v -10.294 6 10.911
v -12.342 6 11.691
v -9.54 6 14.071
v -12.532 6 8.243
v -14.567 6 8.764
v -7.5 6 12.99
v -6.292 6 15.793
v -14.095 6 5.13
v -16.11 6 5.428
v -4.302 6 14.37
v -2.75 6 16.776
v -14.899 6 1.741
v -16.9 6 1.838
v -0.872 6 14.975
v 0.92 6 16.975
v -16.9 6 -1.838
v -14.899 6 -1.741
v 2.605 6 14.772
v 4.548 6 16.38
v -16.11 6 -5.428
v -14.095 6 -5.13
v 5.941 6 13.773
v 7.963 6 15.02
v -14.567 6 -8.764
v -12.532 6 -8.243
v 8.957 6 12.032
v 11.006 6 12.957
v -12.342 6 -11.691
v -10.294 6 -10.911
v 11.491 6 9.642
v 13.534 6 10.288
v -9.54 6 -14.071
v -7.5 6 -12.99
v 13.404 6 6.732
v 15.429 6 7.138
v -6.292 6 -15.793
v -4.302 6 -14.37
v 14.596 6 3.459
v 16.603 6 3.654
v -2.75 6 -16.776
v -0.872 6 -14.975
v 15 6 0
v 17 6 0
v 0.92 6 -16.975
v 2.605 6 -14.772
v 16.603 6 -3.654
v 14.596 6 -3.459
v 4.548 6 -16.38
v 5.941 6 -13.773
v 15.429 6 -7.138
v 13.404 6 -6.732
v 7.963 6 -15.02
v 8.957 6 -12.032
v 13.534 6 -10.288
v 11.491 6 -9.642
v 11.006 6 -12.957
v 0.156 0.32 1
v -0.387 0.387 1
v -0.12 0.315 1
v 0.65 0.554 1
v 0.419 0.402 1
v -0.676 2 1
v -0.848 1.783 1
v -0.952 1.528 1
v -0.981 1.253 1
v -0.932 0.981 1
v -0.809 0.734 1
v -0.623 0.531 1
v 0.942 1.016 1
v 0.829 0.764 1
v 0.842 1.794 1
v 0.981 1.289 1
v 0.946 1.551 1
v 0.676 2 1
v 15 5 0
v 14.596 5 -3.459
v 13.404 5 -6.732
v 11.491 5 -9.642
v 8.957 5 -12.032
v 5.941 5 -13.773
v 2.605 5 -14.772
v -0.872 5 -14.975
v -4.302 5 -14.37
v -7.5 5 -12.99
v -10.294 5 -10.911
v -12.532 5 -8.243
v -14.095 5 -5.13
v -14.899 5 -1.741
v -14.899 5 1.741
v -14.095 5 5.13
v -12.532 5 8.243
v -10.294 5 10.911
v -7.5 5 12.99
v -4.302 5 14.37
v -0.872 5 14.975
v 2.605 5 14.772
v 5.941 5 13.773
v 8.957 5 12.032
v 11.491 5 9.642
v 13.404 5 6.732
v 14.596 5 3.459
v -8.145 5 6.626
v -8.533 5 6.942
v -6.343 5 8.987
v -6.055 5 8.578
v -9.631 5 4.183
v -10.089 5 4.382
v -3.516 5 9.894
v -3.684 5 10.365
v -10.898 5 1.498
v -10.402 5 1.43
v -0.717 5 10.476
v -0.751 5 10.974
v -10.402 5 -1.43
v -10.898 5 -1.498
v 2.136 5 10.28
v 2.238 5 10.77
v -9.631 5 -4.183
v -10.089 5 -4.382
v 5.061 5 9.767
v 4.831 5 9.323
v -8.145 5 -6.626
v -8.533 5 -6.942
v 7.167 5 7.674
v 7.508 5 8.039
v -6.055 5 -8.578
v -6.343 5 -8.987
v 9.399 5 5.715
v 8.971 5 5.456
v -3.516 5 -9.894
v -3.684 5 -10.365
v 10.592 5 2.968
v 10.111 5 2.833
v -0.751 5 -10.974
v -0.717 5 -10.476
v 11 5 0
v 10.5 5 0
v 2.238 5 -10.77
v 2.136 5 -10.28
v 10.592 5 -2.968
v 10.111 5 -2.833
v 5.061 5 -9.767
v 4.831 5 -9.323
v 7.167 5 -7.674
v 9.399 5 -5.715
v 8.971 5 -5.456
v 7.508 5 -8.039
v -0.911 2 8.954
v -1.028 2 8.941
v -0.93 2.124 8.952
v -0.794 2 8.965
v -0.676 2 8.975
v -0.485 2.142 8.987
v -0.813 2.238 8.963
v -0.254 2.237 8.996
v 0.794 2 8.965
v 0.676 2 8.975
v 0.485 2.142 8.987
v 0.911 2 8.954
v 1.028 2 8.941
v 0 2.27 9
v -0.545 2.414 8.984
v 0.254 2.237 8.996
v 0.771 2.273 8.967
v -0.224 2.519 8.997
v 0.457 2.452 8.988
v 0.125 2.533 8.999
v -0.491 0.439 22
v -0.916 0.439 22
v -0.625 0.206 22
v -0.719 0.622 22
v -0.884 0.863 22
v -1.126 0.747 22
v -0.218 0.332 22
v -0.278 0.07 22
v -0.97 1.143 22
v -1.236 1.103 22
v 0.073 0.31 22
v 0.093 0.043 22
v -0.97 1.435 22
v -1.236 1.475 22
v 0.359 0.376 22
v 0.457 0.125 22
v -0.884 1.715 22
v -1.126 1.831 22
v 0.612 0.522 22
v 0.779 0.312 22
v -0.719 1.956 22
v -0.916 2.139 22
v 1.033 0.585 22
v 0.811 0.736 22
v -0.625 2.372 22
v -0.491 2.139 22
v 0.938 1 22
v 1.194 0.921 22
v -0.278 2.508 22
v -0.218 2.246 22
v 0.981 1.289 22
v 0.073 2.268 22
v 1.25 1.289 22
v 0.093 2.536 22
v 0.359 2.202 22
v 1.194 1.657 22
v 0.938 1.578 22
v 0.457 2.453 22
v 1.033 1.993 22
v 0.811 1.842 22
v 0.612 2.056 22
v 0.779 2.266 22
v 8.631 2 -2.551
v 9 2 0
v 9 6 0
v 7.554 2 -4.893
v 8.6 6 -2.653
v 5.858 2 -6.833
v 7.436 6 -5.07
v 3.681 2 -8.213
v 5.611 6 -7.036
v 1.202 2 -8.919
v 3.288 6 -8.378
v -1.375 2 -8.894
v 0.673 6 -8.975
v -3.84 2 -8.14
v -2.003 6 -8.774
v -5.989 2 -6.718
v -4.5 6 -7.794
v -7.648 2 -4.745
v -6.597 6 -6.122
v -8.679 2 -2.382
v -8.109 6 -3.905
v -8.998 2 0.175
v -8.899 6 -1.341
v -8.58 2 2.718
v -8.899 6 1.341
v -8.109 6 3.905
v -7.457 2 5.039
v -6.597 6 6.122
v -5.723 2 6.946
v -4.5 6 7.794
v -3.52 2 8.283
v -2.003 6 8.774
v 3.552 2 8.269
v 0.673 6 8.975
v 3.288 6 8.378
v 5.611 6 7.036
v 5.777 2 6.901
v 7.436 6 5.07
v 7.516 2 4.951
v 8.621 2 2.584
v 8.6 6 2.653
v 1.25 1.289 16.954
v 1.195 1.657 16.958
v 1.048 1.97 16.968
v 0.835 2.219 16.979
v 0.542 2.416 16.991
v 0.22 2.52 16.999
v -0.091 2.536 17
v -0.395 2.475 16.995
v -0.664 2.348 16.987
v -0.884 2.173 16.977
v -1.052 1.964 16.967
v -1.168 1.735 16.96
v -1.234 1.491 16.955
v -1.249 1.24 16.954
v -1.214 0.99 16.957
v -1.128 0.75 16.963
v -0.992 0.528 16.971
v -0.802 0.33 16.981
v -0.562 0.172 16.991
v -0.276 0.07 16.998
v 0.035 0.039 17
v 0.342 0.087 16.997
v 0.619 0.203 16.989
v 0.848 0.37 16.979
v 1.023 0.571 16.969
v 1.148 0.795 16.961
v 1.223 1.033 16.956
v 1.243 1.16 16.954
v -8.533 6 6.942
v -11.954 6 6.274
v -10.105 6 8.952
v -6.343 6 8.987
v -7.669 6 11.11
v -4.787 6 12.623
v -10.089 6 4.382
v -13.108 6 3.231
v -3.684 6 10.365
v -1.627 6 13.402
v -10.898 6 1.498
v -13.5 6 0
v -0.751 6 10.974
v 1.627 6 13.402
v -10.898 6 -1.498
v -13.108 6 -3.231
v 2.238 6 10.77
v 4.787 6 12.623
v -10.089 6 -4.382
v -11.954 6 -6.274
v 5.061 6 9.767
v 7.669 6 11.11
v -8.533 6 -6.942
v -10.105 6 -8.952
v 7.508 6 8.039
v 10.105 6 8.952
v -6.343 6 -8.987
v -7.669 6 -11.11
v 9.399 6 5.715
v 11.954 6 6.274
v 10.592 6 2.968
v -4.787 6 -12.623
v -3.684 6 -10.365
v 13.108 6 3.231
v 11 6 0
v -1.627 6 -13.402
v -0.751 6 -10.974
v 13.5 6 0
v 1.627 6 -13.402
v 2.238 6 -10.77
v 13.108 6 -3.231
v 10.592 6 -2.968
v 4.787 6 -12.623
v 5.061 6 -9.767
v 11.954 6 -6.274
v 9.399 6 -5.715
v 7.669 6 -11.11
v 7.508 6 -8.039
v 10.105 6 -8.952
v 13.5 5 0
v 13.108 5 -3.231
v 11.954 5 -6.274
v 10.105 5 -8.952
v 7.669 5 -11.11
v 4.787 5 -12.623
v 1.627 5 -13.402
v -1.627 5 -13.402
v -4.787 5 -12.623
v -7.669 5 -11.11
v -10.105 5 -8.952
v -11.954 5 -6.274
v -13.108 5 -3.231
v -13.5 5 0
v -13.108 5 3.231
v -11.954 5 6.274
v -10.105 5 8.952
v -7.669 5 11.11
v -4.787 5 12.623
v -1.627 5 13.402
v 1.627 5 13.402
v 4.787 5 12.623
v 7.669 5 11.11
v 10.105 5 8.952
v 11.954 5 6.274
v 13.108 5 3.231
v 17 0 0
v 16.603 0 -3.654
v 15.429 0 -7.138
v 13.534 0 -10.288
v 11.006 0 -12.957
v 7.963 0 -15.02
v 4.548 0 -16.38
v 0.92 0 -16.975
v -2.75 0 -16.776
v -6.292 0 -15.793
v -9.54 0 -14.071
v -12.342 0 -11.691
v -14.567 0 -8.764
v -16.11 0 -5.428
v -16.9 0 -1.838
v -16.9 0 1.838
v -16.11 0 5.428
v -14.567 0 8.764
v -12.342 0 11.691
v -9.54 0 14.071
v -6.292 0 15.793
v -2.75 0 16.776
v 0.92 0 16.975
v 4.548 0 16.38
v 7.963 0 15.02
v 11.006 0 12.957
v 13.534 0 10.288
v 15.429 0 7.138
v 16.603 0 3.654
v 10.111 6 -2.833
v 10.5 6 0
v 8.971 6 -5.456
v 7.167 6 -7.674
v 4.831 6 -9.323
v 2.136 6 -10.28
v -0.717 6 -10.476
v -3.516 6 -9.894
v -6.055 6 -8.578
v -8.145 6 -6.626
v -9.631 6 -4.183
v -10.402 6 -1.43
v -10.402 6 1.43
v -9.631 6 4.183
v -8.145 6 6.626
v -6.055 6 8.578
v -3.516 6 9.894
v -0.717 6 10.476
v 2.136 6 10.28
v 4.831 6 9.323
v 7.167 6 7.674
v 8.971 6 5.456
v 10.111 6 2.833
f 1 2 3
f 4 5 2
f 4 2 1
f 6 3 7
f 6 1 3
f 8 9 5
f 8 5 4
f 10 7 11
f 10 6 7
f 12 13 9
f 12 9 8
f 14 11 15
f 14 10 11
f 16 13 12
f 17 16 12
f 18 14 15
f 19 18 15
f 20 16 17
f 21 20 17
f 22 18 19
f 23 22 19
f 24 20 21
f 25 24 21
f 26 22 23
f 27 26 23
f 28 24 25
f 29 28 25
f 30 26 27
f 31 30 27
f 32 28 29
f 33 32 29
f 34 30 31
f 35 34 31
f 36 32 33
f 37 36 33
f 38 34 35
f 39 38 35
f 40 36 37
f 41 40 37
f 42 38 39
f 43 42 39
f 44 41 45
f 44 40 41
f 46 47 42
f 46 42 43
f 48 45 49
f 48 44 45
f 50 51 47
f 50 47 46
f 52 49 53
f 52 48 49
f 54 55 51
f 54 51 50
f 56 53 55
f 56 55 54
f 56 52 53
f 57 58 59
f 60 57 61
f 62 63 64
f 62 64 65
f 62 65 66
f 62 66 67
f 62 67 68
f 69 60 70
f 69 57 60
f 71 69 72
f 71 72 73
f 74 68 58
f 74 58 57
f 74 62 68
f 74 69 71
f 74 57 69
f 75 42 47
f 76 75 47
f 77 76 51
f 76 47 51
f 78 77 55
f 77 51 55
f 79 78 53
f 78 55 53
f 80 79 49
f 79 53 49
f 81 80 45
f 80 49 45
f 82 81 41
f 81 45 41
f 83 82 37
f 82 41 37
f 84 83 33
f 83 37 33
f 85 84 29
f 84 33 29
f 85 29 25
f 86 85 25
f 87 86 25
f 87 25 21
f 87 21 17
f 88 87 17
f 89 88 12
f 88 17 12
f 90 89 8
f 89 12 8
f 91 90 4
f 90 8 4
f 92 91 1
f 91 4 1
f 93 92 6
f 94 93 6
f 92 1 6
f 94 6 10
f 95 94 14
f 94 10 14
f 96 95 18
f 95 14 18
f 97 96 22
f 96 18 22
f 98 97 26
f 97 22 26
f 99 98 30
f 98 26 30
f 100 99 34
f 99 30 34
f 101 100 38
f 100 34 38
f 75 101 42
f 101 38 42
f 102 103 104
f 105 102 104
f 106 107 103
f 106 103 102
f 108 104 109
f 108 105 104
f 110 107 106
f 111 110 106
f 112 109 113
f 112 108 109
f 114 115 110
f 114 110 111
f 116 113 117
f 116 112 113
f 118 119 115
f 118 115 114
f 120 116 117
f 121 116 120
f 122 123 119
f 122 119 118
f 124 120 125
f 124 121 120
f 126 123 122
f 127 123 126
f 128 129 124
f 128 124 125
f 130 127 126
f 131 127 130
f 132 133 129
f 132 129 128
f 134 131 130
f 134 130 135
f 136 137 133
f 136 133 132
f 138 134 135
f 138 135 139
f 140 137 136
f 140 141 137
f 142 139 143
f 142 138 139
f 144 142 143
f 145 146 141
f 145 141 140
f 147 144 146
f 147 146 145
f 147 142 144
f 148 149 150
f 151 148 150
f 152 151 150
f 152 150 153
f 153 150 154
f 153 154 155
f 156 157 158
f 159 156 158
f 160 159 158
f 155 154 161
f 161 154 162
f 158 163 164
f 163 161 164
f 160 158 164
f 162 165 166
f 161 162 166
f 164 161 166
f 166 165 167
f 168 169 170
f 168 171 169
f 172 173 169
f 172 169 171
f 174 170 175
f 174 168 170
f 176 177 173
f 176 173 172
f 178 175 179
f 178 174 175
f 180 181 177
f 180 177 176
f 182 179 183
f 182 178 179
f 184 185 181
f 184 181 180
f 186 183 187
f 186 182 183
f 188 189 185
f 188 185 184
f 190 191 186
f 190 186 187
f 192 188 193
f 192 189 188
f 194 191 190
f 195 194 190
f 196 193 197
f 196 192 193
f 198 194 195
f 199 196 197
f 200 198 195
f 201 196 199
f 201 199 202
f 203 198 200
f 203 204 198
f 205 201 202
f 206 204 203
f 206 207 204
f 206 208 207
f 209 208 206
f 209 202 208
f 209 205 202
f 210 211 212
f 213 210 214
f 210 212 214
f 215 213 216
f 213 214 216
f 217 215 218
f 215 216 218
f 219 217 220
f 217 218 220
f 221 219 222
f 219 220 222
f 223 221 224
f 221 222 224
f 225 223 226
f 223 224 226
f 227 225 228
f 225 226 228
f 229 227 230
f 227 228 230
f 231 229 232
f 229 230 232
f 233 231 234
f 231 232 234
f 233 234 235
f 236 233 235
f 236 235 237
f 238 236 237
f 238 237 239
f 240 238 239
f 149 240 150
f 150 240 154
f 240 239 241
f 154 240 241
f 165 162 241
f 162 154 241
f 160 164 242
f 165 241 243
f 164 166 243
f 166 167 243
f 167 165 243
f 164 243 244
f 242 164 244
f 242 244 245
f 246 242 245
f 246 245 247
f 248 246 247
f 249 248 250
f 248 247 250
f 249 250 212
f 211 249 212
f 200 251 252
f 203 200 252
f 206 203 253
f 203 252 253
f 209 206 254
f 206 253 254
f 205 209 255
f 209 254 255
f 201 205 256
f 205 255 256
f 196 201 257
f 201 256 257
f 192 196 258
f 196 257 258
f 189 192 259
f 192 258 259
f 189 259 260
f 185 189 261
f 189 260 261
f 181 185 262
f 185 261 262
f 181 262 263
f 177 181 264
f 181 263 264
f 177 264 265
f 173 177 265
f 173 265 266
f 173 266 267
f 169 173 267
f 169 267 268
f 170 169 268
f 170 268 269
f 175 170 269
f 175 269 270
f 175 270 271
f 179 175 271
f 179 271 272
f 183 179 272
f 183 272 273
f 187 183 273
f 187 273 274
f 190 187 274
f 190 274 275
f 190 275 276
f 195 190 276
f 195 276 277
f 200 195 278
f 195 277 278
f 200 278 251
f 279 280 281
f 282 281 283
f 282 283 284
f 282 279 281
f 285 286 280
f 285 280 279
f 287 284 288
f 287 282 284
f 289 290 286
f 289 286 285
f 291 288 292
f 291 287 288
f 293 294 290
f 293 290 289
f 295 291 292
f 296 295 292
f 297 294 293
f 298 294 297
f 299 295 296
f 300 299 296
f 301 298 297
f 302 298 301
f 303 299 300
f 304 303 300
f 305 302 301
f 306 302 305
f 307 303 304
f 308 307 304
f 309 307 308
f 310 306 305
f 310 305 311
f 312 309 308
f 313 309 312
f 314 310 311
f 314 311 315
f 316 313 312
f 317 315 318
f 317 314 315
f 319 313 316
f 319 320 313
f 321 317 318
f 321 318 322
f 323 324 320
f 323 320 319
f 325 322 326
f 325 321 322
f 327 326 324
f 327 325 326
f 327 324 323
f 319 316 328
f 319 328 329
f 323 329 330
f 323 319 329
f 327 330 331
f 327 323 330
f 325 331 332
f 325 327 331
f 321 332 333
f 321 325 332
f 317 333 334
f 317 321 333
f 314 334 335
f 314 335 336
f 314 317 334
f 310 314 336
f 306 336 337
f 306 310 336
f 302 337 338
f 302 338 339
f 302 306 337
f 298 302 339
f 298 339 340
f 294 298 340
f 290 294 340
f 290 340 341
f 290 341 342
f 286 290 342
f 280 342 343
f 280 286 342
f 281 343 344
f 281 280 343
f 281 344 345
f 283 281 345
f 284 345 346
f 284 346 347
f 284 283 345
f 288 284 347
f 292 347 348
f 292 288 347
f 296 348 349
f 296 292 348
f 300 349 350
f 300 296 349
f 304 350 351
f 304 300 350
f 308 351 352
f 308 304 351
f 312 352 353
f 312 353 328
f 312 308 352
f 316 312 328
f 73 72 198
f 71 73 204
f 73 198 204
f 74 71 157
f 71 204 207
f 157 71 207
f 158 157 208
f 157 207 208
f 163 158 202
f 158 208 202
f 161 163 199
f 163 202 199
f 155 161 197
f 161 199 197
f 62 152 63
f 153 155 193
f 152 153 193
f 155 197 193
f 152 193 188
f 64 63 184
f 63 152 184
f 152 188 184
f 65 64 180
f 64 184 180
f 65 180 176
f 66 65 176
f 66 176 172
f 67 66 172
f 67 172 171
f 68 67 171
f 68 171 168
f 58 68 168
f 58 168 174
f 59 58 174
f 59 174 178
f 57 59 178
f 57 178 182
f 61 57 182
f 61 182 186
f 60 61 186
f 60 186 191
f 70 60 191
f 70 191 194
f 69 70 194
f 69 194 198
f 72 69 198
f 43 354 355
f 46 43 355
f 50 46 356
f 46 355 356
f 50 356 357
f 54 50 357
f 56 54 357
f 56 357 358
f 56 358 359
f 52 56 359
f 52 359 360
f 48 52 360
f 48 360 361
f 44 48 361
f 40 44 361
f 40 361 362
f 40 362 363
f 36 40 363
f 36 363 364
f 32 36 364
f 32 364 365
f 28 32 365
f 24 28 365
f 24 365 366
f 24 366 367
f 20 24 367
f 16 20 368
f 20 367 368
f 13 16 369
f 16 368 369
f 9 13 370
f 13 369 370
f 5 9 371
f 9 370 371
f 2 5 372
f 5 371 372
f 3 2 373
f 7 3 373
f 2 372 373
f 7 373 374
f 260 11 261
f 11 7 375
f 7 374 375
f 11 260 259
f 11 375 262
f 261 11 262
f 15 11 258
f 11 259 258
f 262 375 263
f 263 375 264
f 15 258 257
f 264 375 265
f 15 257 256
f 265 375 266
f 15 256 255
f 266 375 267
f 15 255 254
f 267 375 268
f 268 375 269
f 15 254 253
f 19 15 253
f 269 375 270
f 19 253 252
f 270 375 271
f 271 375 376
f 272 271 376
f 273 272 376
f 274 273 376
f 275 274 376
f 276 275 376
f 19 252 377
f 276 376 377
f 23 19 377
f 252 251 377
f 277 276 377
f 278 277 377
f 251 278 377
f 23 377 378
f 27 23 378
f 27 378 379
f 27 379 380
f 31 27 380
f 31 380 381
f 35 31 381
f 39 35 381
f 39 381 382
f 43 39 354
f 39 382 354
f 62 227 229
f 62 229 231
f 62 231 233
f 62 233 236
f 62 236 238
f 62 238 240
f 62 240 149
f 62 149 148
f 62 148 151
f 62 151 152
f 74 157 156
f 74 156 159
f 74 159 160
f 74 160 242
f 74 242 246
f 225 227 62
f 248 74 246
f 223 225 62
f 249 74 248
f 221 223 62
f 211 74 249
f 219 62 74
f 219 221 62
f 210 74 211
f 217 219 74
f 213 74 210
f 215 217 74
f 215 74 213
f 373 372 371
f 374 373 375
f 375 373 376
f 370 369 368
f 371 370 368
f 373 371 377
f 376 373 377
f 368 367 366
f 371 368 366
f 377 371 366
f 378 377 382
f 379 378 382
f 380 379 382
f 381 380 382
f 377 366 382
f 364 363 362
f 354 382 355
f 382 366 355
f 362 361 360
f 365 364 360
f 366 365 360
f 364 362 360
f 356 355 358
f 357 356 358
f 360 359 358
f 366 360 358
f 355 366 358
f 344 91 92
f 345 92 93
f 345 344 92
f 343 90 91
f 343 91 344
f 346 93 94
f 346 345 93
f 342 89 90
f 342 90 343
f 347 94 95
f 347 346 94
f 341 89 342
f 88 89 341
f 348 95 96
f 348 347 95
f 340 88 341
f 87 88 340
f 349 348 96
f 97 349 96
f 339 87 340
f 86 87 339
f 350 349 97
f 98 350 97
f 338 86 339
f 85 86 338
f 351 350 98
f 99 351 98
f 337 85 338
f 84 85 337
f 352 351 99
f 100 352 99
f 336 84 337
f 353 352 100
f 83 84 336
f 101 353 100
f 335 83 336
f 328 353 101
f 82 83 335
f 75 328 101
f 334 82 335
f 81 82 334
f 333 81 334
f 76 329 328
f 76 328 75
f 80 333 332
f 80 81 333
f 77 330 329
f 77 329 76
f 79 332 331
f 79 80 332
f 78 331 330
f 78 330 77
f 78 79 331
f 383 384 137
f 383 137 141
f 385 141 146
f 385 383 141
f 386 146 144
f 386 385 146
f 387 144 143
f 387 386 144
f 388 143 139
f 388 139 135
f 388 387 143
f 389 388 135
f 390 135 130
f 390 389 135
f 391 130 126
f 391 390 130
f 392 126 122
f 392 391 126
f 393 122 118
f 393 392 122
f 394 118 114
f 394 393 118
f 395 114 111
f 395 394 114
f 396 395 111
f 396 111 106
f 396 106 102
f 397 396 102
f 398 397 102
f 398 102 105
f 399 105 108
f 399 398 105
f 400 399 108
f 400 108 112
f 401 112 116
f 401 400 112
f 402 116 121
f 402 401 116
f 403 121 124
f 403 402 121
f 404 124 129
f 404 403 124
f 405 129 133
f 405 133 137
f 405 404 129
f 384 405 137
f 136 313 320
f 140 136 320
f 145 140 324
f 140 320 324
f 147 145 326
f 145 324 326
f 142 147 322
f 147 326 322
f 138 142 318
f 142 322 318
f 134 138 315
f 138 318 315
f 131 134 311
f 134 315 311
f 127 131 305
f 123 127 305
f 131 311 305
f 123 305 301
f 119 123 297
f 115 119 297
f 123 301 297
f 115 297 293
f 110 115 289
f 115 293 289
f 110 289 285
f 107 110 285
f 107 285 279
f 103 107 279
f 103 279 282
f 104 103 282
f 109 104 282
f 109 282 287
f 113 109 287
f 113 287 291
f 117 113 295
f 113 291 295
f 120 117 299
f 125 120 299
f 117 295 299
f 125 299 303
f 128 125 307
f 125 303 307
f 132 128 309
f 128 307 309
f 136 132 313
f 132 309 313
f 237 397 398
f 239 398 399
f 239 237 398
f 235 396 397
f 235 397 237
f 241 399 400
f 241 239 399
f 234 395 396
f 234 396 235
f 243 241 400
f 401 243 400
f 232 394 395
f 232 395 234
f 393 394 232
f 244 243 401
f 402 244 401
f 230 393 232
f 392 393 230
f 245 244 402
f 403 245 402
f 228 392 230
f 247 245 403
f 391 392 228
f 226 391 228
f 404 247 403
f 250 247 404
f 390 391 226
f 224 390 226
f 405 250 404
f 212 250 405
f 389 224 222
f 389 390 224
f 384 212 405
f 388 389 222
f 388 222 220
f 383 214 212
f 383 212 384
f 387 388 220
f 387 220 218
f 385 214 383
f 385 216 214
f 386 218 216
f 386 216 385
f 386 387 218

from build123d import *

# Parameters (mm, degrees)
SKETCH1_R           = 17
BOSS_EXTRUDE1_DEPTH = 6
SKETCH2_R           = 15
SKETCH2_R_2         = 13.5
CUT_EXTRUDE1_DEPTH  = 1
SKETCH3_R           = 11
SKETCH3_R_2         = 10.5
CUT_EXTRUDE2_DEPTH  = 1
SKETCH4_R           = 9
CUT_EXTRUDE3_DEPTH  = 4
SKETCH8_R           = 1.25
BOSS_EXTRUDE2_DEPTH = 22
SKETCH9_R           = 9
CUT_EXTRUDE5_DEPTH  = 4
SKETCH10_R          = 0.981301711
CUT_EXTRUDE6_DEPTH  = 21


with BuildPart() as part:
    # Sketch1 → Boss-Extrude1 (new body)
    with BuildSketch(Plane(origin=(0, 0, 0), x_dir=(1, 0, 0), z_dir=(0, 1, 0))):
        Circle(SKETCH1_R)
    extrude(amount=BOSS_EXTRUDE1_DEPTH)

    # Sketch2 → Cut-Extrude1 (cut)
    with BuildSketch(Plane(origin=(0, 6, 0), x_dir=(1, 0, 0), z_dir=(0, 1, 0))):
        Circle(SKETCH2_R)
        Circle(SKETCH2_R_2, mode=Mode.SUBTRACT)
    extrude(amount=-CUT_EXTRUDE1_DEPTH, mode=Mode.SUBTRACT)

    # Sketch3 → Cut-Extrude2 (cut)
    with BuildSketch(Plane(origin=(0, 6, 0), x_dir=(1, 0, 0), z_dir=(0, 1, 0))):
        Circle(SKETCH3_R)
        Circle(SKETCH3_R_2, mode=Mode.SUBTRACT)
    extrude(amount=-CUT_EXTRUDE2_DEPTH, mode=Mode.SUBTRACT)

    # Sketch4 → Cut-Extrude3 (cut)
    with BuildSketch(Plane(origin=(0, 6, 0), x_dir=(1, 0, 0), z_dir=(0, 1, 0))):
        Circle(SKETCH4_R)
    extrude(amount=-CUT_EXTRUDE3_DEPTH, mode=Mode.SUBTRACT)

    # Sketch8 → Boss-Extrude2 (add)
    with BuildSketch(Plane.XY):
        with Locations((0, 1.289022222)):
            Circle(SKETCH8_R)
    extrude(amount=BOSS_EXTRUDE2_DEPTH)

    # Sketch9 → Cut-Extrude5 (cut)
    with BuildSketch(Plane(origin=(0, 6, 0), x_dir=(1, 0, 0), z_dir=(0, 1, 0))):
        Circle(SKETCH9_R)
    extrude(amount=-CUT_EXTRUDE5_DEPTH, mode=Mode.SUBTRACT)

    # Sketch10 → Cut-Extrude6 (cut)
    with BuildSketch(Plane.XY.offset(22)):
        with Locations((0, 1.289022222)):
            Circle(SKETCH10_R)
    extrude(amount=-CUT_EXTRUDE6_DEPTH, mode=Mode.SUBTRACT)


solid = part.part
